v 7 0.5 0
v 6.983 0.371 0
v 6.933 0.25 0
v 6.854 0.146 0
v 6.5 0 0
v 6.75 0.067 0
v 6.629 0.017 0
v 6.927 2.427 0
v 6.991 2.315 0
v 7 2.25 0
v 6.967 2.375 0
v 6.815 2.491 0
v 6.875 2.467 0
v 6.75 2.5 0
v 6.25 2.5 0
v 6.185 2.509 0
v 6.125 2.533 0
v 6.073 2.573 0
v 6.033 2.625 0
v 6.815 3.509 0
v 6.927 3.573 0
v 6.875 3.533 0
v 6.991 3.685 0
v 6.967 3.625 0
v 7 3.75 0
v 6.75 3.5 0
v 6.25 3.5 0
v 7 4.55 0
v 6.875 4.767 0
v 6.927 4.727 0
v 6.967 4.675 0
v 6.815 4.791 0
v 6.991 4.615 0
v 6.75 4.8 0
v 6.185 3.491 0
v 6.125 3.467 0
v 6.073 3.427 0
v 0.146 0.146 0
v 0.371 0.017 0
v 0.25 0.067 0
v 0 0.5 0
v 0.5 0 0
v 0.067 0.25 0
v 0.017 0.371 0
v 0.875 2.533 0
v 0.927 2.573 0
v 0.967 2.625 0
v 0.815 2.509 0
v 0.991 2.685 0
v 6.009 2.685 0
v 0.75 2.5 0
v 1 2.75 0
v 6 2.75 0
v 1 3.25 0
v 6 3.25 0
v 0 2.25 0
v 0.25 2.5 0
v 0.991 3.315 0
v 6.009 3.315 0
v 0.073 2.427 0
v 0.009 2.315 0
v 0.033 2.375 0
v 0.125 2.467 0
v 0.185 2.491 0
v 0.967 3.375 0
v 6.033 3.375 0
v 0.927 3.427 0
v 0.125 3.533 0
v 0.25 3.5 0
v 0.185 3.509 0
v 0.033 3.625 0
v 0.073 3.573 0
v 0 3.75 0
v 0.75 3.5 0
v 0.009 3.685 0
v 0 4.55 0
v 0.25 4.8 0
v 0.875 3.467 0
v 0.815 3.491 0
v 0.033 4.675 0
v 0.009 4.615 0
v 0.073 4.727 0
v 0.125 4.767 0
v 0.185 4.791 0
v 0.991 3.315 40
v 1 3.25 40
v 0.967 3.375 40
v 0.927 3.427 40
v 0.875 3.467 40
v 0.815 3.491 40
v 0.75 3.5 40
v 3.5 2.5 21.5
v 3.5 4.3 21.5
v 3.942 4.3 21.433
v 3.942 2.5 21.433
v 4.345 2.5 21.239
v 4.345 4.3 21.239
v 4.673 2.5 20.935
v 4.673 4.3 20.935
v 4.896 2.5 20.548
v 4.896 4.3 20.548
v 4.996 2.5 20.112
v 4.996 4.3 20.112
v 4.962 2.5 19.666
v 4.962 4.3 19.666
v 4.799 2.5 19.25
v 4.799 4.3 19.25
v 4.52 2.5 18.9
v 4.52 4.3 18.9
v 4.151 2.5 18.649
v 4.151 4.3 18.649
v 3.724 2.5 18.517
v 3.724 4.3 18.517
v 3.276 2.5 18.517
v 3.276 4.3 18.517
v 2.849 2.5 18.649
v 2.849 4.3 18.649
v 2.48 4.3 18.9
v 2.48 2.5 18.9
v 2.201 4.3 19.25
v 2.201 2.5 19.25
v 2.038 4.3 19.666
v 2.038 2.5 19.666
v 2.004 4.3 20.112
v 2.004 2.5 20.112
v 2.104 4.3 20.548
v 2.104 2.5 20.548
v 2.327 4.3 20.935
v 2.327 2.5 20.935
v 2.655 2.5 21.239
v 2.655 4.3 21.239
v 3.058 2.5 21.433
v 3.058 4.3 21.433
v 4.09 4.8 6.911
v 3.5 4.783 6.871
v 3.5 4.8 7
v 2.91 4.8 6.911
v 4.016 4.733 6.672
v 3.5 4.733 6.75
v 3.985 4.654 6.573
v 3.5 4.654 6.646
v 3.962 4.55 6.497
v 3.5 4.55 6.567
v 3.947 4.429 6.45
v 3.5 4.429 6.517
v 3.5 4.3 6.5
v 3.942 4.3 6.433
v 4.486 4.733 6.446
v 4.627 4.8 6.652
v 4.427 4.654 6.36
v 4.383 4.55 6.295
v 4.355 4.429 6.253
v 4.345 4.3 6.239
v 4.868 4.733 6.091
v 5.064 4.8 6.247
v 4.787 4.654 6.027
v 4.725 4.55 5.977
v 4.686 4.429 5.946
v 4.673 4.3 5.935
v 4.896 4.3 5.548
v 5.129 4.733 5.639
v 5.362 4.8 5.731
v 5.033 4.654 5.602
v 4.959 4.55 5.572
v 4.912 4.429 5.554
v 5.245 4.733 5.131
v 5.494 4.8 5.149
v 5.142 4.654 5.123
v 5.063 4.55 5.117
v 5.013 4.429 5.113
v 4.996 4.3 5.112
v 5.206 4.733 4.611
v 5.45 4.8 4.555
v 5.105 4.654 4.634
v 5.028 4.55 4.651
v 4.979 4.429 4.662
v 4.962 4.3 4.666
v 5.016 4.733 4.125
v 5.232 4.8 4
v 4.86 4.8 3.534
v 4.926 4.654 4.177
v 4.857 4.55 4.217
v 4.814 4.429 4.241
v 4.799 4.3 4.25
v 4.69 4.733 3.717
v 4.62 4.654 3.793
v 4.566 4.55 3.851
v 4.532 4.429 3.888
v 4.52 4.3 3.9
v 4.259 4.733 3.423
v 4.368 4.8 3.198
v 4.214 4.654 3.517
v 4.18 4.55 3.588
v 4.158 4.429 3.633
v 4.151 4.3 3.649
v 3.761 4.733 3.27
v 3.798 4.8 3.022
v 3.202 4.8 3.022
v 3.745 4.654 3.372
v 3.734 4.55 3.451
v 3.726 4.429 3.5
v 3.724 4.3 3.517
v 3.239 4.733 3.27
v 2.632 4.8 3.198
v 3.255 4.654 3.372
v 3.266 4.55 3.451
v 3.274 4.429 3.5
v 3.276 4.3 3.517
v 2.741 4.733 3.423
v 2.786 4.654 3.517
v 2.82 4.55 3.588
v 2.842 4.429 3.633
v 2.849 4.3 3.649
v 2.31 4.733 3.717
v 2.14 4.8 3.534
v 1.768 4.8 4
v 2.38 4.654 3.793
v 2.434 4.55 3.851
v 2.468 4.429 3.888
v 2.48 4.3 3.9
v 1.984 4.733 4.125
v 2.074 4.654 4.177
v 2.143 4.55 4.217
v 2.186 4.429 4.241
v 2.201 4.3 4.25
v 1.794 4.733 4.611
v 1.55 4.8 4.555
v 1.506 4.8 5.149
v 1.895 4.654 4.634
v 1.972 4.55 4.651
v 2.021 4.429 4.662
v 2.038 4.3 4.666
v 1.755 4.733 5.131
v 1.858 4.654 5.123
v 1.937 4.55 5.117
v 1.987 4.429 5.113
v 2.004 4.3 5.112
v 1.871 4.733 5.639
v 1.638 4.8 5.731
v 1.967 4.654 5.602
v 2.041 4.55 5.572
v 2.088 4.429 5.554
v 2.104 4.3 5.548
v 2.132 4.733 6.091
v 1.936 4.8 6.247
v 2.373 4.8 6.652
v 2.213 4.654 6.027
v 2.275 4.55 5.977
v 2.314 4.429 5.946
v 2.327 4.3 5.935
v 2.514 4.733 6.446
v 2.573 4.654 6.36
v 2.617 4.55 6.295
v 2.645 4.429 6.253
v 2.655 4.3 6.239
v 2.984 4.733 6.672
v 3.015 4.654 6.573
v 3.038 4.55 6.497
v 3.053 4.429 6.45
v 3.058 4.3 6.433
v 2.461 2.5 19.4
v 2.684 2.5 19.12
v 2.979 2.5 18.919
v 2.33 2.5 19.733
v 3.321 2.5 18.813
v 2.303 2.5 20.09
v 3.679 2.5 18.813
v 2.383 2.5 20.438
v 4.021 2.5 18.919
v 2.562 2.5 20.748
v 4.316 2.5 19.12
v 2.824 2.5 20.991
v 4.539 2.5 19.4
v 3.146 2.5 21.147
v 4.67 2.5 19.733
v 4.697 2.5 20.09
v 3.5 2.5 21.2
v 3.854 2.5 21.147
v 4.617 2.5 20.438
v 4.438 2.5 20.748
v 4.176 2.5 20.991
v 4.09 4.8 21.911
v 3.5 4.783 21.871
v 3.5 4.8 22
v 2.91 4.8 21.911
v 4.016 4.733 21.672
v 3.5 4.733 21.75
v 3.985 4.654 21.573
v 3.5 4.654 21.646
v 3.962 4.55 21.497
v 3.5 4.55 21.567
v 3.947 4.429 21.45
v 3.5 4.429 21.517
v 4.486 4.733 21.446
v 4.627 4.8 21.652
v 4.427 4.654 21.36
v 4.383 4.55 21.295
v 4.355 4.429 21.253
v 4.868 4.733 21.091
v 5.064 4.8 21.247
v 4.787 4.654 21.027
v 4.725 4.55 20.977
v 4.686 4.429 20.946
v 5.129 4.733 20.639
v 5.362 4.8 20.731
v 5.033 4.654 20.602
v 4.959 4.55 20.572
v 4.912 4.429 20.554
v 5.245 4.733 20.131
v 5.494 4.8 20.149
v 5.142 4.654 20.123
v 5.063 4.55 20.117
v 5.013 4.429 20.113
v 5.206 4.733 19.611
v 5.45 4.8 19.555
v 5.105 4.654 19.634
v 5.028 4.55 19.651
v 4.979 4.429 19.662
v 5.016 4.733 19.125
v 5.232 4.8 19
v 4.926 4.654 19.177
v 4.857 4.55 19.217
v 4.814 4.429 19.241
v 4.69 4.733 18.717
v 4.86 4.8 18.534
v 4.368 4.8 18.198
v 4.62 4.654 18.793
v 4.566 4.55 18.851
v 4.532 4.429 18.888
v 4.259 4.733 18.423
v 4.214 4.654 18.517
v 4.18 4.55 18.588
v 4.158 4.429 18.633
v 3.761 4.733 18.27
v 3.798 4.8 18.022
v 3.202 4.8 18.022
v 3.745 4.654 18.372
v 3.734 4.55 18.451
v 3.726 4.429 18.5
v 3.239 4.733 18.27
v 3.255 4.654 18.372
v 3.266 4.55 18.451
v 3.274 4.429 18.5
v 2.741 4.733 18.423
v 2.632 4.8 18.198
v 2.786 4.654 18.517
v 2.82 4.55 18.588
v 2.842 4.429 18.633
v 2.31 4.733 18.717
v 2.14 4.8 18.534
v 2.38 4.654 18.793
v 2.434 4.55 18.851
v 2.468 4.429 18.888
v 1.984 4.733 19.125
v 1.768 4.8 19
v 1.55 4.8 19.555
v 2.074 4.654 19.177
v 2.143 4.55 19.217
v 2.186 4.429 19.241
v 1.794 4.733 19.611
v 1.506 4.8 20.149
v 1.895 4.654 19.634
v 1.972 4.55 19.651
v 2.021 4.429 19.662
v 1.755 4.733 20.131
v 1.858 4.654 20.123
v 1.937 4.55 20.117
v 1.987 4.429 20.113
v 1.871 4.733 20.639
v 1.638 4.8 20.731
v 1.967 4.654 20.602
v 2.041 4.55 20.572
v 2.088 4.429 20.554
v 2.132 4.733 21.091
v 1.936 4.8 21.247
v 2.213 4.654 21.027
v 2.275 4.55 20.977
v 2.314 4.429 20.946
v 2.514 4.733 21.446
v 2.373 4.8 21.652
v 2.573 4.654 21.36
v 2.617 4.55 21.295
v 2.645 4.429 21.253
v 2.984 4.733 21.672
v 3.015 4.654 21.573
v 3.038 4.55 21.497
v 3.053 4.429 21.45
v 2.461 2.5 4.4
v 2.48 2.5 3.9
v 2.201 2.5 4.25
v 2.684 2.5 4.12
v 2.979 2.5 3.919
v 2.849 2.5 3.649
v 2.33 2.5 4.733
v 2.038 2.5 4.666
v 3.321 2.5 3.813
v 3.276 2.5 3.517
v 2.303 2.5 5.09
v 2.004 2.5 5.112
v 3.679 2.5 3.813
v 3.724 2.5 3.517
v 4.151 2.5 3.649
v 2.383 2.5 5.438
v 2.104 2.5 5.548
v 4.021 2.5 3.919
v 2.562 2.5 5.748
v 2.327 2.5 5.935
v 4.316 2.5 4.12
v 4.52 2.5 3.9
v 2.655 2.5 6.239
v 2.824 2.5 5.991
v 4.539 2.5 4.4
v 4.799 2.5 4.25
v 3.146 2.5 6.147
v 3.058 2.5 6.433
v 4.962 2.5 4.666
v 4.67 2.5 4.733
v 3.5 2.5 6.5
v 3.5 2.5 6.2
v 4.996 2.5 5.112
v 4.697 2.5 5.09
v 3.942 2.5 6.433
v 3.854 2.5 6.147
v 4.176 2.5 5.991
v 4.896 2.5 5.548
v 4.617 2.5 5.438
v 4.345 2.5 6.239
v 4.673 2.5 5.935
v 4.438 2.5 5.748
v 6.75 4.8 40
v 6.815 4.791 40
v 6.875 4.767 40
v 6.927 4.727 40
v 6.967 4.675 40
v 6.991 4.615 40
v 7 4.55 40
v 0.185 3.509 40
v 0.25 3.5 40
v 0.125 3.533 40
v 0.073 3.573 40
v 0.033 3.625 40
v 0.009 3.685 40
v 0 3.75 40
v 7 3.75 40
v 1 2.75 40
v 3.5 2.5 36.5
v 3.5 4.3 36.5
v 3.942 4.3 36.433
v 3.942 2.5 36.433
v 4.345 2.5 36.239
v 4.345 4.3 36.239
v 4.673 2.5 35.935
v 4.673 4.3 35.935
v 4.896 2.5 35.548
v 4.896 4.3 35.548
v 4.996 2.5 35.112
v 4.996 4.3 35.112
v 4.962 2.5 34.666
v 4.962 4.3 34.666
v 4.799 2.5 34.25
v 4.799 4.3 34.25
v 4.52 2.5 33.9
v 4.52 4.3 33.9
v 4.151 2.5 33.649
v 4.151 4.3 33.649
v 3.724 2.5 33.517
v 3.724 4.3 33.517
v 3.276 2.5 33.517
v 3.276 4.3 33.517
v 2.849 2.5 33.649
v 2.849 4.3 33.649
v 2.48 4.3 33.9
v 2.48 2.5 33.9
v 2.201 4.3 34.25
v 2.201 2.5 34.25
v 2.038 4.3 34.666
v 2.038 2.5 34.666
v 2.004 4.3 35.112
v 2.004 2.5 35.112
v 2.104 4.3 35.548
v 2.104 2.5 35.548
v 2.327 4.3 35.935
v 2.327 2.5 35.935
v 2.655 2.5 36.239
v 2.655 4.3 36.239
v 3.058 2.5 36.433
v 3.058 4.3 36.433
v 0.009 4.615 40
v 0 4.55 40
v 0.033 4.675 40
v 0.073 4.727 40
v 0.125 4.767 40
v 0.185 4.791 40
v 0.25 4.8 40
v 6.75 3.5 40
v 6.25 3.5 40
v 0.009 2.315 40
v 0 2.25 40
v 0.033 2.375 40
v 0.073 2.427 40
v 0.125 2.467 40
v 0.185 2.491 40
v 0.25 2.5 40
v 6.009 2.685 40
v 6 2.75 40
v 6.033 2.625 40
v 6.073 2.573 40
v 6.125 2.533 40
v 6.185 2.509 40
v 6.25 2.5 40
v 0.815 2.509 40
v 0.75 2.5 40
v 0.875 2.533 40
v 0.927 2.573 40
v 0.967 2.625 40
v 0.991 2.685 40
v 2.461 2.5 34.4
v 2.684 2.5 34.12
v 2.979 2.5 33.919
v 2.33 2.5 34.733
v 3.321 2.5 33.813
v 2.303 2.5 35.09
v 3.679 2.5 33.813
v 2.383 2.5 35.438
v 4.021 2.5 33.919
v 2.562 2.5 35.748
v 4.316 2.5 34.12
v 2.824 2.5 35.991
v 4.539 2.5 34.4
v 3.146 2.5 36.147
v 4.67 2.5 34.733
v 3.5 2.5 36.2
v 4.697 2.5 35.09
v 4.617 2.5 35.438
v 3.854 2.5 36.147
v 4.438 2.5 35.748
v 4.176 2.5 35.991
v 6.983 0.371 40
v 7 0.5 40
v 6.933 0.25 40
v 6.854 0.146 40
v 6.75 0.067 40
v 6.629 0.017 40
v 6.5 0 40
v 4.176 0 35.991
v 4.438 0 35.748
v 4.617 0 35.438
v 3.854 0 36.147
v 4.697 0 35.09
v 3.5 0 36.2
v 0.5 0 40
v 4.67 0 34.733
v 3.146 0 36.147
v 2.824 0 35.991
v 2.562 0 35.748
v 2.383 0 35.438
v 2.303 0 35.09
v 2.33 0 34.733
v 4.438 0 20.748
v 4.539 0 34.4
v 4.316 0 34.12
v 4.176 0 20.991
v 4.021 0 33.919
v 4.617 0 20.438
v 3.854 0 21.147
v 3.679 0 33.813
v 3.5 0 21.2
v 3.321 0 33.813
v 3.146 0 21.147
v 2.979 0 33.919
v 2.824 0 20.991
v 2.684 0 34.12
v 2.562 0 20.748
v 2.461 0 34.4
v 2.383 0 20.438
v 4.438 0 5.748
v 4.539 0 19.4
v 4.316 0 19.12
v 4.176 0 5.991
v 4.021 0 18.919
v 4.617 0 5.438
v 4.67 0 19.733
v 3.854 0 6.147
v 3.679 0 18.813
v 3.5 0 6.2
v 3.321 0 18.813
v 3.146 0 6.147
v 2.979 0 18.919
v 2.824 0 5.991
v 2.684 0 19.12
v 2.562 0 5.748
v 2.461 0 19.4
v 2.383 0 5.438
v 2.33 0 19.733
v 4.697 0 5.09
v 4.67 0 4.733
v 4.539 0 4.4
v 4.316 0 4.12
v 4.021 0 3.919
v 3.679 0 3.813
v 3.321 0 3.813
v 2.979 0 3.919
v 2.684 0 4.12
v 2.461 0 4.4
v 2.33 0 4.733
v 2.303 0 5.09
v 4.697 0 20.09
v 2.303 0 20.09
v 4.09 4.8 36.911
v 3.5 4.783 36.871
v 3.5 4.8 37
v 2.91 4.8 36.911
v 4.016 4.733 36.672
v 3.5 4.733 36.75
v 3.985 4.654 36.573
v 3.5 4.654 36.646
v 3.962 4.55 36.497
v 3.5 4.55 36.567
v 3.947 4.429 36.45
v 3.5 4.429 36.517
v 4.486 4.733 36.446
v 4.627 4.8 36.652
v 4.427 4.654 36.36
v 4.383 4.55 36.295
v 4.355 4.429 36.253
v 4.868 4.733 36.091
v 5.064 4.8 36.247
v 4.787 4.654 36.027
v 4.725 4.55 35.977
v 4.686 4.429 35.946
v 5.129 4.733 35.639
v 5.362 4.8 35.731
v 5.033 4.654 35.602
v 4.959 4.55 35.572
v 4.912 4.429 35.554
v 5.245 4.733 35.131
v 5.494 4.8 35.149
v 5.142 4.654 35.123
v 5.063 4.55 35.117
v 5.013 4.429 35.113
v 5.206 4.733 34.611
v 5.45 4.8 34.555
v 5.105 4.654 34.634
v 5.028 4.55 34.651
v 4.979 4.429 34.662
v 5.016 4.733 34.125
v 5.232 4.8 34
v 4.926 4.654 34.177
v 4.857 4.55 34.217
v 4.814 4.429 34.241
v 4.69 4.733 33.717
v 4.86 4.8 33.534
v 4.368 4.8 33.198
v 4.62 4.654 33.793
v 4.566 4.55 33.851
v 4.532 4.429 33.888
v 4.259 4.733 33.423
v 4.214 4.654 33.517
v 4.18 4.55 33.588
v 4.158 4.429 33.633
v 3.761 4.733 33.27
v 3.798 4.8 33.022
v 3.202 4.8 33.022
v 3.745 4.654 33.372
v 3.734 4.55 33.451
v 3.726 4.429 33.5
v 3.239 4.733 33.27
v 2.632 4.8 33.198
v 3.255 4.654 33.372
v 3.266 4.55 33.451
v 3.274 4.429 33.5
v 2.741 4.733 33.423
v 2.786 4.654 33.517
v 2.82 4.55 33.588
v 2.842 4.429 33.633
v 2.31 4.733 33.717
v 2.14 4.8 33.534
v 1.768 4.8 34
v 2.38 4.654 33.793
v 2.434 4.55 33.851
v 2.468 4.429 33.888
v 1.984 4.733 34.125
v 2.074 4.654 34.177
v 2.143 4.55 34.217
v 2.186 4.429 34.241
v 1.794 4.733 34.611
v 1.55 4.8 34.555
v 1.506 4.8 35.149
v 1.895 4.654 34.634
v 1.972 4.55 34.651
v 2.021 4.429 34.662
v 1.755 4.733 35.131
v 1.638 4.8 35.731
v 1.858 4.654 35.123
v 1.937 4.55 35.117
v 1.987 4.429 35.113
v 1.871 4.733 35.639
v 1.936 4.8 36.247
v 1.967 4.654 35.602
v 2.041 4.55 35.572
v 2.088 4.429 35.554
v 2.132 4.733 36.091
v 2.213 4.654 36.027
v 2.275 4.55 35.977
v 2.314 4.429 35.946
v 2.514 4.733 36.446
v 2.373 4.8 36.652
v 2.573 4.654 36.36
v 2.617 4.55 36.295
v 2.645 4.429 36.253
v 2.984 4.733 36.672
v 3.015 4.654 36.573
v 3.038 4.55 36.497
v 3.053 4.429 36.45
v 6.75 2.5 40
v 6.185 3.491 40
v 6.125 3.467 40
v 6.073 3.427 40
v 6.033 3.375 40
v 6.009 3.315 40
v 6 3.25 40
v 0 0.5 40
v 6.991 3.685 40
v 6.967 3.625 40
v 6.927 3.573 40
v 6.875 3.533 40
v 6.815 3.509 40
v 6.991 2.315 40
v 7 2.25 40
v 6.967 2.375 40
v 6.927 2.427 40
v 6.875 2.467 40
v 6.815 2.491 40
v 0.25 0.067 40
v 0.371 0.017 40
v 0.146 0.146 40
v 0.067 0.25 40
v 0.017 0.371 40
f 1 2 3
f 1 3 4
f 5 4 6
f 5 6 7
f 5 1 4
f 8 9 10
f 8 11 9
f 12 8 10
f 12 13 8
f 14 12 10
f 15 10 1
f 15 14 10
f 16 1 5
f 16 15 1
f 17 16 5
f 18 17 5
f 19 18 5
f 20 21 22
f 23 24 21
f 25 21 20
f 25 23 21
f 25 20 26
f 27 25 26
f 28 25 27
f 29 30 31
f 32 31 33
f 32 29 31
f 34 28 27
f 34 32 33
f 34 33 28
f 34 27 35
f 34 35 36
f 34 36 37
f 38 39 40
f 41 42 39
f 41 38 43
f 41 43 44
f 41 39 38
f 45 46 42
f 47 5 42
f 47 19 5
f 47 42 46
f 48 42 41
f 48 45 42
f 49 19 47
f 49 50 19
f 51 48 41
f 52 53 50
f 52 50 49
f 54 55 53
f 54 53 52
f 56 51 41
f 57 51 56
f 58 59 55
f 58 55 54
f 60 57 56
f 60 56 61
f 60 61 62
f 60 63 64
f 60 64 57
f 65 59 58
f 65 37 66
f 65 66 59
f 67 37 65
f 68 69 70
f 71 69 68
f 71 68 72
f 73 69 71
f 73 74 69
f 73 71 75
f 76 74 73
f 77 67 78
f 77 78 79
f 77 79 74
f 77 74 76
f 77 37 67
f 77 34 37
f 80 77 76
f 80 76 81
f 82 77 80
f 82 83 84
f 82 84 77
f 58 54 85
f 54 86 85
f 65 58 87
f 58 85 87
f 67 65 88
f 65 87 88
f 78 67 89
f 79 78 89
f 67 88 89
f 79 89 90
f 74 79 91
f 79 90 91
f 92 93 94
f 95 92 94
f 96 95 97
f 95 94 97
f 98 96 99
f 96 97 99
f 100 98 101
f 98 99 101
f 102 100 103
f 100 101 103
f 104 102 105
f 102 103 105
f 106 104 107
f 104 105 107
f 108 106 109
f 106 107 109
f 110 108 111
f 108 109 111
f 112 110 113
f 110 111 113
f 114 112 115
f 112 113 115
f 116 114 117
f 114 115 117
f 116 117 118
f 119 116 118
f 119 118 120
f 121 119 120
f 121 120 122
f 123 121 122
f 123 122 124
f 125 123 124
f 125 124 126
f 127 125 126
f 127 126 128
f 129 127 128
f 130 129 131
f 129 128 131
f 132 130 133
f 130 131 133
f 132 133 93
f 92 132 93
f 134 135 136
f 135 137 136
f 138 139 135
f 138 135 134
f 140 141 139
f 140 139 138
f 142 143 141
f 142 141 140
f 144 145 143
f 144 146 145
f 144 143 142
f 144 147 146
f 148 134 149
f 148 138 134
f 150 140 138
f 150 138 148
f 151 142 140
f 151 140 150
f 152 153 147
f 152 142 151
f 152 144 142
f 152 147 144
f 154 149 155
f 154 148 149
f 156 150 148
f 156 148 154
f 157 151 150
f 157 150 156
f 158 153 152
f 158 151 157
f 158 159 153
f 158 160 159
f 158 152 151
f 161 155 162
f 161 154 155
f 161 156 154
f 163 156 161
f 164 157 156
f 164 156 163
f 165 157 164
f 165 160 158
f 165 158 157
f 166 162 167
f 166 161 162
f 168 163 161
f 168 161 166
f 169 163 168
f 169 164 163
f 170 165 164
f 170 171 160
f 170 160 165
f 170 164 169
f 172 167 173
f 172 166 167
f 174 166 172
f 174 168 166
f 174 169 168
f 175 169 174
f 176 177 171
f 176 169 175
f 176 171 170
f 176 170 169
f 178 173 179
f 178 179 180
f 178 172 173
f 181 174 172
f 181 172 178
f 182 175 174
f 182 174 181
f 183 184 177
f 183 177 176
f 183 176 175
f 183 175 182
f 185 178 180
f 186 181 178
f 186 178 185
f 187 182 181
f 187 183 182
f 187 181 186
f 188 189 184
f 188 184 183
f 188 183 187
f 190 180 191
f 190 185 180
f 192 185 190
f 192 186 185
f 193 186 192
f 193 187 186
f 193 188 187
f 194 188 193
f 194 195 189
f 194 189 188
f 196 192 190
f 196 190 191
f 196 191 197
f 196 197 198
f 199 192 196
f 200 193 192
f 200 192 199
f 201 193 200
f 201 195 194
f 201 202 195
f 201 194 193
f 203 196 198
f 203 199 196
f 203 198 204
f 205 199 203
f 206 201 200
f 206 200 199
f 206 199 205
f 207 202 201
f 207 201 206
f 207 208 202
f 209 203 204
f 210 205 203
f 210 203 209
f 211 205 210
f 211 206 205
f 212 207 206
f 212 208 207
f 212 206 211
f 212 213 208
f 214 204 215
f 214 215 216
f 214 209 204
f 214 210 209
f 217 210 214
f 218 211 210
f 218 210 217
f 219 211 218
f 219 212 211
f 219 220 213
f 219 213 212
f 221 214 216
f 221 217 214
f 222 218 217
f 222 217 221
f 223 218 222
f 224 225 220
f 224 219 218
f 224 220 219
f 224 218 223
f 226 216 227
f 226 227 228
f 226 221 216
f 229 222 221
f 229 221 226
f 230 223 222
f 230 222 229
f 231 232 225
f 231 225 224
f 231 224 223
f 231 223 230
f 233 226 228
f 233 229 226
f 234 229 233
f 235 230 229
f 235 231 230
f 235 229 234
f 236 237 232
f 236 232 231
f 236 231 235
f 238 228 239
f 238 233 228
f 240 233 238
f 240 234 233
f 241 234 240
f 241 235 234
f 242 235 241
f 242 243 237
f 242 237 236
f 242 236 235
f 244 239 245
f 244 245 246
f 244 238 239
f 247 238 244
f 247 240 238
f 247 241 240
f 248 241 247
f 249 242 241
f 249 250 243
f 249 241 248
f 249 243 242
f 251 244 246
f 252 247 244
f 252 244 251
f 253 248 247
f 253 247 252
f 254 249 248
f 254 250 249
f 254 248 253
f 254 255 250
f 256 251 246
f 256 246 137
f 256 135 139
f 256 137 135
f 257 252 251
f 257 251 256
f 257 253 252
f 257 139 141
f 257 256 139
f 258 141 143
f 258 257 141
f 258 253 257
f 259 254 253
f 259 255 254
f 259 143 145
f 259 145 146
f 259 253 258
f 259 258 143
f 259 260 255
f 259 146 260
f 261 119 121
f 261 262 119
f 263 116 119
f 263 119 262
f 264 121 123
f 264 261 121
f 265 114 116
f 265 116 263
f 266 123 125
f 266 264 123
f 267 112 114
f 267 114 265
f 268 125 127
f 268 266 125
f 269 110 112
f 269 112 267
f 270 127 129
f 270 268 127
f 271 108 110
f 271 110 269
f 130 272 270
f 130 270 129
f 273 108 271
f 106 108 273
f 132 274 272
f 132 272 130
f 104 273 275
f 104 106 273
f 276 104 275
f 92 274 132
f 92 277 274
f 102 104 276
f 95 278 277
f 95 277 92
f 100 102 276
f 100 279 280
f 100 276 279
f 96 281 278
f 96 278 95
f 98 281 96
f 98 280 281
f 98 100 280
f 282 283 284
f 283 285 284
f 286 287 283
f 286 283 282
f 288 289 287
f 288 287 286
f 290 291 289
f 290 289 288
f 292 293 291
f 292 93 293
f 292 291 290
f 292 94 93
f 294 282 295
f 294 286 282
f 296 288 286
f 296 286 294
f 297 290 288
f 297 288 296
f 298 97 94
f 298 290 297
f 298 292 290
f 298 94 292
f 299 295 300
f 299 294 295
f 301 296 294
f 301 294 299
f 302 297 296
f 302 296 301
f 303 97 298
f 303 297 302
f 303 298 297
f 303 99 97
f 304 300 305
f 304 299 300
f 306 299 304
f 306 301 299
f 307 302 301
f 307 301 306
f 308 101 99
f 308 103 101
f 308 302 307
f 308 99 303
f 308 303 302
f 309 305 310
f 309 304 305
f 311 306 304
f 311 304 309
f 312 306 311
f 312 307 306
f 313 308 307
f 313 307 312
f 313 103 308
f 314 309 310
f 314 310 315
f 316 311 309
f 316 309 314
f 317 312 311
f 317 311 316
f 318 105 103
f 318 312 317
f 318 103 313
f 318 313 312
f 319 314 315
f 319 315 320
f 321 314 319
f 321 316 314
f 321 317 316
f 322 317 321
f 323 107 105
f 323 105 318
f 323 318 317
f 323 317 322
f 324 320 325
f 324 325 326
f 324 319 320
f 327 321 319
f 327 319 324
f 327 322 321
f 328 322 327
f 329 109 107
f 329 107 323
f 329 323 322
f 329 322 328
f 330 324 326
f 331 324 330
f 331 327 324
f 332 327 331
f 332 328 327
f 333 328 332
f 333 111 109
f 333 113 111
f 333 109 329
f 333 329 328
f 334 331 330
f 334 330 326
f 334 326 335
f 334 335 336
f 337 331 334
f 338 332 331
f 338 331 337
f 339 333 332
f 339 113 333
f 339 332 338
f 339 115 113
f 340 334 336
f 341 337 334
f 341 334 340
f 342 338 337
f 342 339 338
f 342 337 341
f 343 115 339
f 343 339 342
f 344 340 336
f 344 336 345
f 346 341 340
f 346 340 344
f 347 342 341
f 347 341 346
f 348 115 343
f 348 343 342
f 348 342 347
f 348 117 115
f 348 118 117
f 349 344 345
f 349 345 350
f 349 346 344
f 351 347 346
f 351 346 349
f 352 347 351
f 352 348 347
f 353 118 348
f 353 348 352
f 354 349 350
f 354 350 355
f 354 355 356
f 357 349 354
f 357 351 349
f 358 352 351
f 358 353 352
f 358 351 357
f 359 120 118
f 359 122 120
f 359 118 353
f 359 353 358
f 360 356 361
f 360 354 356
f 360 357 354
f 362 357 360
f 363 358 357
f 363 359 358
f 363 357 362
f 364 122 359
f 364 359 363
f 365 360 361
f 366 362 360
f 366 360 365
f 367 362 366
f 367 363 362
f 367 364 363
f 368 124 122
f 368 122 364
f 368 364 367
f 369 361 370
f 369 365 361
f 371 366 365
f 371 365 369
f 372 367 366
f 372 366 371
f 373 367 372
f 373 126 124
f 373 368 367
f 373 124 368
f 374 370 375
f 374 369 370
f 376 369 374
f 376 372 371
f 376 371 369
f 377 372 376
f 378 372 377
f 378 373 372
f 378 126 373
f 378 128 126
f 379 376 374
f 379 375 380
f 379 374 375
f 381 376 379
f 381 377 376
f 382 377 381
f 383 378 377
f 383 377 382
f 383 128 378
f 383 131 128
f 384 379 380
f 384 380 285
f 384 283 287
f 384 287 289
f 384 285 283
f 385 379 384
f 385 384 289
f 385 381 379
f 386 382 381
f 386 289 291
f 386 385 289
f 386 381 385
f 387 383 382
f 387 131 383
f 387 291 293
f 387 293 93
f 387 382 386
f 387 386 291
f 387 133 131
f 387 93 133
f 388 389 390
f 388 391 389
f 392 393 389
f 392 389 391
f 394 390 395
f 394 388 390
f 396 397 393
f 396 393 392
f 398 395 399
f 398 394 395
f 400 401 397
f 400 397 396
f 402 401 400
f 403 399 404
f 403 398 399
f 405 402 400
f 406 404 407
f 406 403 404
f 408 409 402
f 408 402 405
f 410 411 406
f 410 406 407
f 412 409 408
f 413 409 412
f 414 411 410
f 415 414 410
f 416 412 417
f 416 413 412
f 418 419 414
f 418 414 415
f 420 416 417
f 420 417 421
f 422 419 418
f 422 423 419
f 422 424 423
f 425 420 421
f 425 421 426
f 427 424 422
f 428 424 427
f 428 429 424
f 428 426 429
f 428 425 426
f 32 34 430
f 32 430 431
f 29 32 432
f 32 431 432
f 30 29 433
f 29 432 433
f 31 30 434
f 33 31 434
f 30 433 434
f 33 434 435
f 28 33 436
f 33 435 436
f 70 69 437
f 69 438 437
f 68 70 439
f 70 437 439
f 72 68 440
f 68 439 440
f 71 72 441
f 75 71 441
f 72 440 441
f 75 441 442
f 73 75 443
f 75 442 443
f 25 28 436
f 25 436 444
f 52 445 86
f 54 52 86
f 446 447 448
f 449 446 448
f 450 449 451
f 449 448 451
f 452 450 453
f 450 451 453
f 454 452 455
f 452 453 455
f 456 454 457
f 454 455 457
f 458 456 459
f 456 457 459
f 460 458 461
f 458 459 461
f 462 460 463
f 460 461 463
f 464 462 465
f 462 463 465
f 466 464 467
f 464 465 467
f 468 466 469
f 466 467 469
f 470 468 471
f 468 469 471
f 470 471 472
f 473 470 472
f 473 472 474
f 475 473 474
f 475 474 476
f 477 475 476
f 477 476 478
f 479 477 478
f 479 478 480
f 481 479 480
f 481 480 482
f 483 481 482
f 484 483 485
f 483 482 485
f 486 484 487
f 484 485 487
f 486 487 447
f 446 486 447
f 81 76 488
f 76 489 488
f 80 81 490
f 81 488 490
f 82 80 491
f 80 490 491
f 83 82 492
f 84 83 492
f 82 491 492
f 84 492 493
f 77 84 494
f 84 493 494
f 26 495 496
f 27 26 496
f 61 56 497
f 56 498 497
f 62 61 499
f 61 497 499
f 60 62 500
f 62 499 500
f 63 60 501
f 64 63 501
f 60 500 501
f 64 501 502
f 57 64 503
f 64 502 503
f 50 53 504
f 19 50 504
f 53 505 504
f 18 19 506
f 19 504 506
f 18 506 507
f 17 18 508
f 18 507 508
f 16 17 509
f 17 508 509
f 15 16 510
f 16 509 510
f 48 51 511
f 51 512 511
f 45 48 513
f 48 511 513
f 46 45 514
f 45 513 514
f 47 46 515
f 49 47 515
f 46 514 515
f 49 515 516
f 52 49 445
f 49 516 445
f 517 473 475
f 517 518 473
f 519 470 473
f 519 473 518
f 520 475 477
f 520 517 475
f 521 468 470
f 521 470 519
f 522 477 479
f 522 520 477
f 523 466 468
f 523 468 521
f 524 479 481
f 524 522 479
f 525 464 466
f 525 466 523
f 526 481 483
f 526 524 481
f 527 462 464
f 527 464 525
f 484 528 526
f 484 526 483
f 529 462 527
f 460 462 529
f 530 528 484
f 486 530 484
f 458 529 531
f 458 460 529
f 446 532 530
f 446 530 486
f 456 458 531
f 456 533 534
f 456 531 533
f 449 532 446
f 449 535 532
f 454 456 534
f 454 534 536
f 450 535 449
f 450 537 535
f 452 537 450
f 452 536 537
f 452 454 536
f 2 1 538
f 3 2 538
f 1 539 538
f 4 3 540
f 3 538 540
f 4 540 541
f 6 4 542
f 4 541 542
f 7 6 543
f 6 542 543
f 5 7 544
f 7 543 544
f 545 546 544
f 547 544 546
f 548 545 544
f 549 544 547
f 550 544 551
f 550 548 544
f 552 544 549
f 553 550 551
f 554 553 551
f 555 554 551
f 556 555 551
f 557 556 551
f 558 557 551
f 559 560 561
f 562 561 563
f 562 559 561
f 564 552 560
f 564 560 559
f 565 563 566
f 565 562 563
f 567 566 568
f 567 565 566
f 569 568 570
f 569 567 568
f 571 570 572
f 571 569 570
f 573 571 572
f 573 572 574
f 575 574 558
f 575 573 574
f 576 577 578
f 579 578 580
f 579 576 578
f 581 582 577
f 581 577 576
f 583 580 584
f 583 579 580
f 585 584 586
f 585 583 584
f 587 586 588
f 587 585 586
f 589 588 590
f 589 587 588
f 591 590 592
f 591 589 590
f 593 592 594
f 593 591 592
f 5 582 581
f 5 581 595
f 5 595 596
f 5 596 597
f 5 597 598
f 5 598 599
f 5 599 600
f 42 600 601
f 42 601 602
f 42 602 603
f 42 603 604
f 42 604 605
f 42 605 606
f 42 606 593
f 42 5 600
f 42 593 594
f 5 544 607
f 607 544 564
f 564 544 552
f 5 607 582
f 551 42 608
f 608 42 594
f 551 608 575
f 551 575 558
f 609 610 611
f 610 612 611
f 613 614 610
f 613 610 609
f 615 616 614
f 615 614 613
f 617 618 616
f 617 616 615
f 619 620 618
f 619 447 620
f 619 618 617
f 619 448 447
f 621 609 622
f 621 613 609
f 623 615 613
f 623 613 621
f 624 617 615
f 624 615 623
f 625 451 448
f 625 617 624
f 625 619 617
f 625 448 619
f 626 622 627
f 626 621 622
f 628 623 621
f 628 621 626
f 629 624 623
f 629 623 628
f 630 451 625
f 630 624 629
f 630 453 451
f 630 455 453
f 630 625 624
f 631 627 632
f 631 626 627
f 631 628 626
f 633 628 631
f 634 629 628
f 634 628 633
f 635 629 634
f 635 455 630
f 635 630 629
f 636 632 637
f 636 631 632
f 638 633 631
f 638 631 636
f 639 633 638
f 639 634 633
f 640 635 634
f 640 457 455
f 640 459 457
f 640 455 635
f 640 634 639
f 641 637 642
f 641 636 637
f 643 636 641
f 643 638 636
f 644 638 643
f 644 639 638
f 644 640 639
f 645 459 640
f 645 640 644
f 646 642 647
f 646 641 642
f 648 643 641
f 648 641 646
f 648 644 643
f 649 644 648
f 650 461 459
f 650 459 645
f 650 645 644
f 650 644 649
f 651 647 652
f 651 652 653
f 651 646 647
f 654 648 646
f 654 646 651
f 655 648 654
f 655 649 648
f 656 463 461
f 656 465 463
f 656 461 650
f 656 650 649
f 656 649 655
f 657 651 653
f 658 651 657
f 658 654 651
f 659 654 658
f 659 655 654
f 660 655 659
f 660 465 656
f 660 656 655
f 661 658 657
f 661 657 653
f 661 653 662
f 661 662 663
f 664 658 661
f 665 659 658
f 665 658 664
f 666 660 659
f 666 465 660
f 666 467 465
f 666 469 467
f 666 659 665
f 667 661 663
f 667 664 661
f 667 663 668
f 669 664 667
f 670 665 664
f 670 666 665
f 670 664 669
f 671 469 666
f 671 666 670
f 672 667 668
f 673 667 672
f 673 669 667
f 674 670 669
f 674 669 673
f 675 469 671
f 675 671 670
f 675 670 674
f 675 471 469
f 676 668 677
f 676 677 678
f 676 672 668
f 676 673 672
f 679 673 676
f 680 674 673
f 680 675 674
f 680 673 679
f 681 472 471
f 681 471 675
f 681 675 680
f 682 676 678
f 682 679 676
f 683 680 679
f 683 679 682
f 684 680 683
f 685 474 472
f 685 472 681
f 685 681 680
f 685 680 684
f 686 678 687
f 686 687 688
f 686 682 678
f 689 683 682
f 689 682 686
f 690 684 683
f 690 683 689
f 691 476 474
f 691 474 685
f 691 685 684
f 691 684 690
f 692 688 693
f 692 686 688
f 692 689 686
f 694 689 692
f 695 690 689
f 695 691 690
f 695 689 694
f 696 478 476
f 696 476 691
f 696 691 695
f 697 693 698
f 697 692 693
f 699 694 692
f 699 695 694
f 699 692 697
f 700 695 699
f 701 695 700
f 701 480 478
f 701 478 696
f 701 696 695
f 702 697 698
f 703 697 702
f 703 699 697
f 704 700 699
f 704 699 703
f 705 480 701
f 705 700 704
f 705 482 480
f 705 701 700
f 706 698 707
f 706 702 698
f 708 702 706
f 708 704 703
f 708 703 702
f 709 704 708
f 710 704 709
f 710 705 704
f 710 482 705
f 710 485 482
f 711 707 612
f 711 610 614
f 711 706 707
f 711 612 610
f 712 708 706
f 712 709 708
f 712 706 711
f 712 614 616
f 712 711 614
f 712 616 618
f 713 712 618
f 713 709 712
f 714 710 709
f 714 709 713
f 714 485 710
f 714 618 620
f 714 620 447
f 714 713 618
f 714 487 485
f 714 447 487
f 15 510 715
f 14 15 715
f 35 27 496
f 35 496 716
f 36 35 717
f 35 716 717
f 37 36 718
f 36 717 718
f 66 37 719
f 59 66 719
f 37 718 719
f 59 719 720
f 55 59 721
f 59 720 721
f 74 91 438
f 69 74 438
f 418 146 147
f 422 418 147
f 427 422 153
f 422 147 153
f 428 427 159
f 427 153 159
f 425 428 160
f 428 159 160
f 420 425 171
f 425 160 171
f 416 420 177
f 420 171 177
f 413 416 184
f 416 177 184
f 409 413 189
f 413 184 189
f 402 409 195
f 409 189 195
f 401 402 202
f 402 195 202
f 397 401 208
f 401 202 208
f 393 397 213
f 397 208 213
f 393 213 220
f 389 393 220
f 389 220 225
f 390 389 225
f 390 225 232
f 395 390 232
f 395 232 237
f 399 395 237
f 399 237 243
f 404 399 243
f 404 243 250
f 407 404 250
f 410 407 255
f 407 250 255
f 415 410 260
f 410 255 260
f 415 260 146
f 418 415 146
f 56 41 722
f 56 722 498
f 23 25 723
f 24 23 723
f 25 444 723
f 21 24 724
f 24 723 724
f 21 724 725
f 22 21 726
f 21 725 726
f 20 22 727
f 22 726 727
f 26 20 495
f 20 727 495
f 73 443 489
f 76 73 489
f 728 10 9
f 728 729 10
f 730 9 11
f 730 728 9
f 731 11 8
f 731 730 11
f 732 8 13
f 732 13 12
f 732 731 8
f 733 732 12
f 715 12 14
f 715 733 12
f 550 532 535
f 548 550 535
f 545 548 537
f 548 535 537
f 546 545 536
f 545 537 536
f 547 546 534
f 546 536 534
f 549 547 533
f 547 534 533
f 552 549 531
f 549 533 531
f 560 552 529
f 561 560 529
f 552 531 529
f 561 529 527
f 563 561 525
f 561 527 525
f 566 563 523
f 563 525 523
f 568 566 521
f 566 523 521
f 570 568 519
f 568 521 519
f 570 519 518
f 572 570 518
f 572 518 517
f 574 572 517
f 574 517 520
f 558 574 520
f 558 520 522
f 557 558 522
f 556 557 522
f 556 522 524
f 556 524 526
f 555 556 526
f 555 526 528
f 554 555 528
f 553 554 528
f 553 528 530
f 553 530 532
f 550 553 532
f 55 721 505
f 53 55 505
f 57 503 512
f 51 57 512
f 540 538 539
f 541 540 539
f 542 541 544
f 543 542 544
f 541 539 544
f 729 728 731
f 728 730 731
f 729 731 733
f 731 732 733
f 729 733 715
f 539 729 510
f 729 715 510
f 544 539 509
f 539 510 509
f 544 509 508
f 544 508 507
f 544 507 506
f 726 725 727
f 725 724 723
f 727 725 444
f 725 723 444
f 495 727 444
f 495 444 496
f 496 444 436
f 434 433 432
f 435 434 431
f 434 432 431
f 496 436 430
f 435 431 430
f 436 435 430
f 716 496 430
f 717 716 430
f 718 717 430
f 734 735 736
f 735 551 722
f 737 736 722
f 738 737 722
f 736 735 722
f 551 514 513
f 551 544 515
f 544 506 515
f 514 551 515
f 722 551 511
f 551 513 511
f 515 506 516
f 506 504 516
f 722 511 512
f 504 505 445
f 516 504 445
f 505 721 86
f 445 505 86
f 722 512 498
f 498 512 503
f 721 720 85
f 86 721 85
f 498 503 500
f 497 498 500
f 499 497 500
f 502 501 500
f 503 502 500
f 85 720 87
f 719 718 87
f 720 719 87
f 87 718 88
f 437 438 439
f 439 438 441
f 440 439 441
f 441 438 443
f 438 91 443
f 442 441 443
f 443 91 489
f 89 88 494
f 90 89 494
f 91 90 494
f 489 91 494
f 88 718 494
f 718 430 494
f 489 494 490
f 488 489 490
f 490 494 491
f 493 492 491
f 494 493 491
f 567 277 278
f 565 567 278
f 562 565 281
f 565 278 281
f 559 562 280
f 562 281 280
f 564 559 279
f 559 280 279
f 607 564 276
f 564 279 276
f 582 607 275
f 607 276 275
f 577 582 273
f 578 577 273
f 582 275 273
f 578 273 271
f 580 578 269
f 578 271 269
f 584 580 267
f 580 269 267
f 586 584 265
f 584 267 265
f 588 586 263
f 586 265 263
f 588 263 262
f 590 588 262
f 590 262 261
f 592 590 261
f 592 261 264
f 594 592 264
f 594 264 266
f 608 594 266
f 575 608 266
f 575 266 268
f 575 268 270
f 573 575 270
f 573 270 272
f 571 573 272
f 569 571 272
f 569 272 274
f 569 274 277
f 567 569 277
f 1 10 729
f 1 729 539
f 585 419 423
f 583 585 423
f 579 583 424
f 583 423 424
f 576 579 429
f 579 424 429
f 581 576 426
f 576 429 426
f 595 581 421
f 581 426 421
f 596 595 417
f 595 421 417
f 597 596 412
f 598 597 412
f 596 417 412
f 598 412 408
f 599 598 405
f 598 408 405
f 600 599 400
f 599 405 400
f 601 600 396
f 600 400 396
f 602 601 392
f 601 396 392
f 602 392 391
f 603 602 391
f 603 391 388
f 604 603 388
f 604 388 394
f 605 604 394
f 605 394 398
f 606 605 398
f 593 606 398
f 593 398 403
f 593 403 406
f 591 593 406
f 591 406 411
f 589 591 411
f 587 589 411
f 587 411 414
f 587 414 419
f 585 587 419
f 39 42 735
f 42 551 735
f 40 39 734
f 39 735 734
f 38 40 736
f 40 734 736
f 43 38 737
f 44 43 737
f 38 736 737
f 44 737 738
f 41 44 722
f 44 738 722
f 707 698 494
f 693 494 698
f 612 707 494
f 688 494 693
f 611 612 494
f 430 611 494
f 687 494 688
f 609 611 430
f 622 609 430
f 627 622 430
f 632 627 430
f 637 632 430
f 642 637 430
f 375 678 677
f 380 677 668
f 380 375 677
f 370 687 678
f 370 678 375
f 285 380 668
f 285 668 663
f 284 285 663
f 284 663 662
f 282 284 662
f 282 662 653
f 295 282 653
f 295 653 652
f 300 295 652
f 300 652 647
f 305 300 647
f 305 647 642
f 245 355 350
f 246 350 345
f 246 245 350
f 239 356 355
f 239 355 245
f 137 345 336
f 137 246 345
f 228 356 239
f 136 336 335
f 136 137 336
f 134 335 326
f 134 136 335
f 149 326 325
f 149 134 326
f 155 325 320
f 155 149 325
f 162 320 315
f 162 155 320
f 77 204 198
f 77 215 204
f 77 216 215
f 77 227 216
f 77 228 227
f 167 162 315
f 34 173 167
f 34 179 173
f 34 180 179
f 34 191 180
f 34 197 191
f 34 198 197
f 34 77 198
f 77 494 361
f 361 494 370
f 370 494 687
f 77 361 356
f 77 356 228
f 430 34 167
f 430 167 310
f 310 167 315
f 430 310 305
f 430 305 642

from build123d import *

# Parameters (mm, degrees)
EXTRUDE_1_DEPTH                = 40
FILLET_1_R                     = 0.25
FILLET_2_R                     = 0.5
SKETCH_2_R                     = 1.5
CUT_EXTRUDE_1_DEPTH            = 2.3
SKETCH_3_R                     = 1.2
CUT_EXTRUDE_2_DEPTH            = 41.684763733
FILLET_3_R                     = 0.5
PATTERN_LINEAR_2_COUNT         = 3
PATTERN_LINEAR_2_PITCH         = 15
FILLET_3_OF_PATTERN_LINEAR_2_R = 0.5


with BuildPart() as part:
    # 草图1 → 凸台-拉伸1 (new body)
    with BuildSketch(Plane.XY):
        Polygon((7, 2.5), (7, 0), (0, 0), (0, 2.5), (1, 2.5), (1, 3.5), (0, 3.5), (0, 4.8), (7, 4.8), (7, 3.5), (6, 3.5), (6, 2.5), align=None)
    extrude(amount=EXTRUDE_1_DEPTH)

    # 圆角1
    fillet_1_edges = [part.edges().sort_by_distance(p)[0] for p in [
        (0, 2.5, 20),
        (1, 2.5, 20),
        (1, 3.5, 20),
        (0, 3.5, 20),
        (0, 4.8, 20),
        (7, 4.8, 20),
        (7, 3.5, 20),
        (6, 3.5, 20),
        (6, 2.5, 20),
        (7, 2.5, 20),
    ]]
    fillet(fillet_1_edges, radius=FILLET_1_R)

    # 圆角2
    fillet_2_edges = [part.edges().sort_by_distance(p)[0] for p in [
        (7, 0, 20),
        (0, 0, 20),
    ]]
    fillet(fillet_2_edges, radius=FILLET_2_R)

    # 草图2 → 切除-拉伸1 (cut)
    with BuildSketch(Plane(origin=(0, 4.8, 0), x_dir=(1, 0, 0), z_dir=(0, 1, 0))):
        with Locations(Location((3.5, -5, 0), (0, 0, 270))):
            Circle(SKETCH_2_R)
    cut_extrude_1 = extrude(amount=-CUT_EXTRUDE_1_DEPTH, mode=Mode.SUBTRACT)

    # 草图3 → 切除-拉伸2 (cut, through all)
    with BuildSketch(Plane(origin=(0, 2.5, 0), x_dir=(1, 0, 0), z_dir=(0, 1, 0))):
        with Locations(Location((3.5, -5, 0), (0, 0, 270))):
            Circle(SKETCH_3_R)
    cut_extrude_2 = extrude(amount=-CUT_EXTRUDE_2_DEPTH, mode=Mode.SUBTRACT)

    # 圆角3
    fillet_3_edges = [part.edges().sort_by_distance(p)[0] for p in [
        (3.5, 4.8, 3.5),
    ]]
    fillet(fillet_3_edges, radius=FILLET_3_R)

    # 阵列(线性)2: 切除-拉伸1, 切除-拉伸2 ×3
    with Locations(*[(0, 0, i * PATTERN_LINEAR_2_PITCH) for i in range(1, PATTERN_LINEAR_2_COUNT)]):
        add(cut_extrude_1, mode=Mode.SUBTRACT)
        add(cut_extrude_2, mode=Mode.SUBTRACT)

    # 圆角3 of 阵列(线性)2
    fillet_3_of_pattern_linear_2_edges = [part.edges().sort_by_distance(p)[0] for p in [
        (3.5, 4.8, 18.5),
        (3.5, 4.8, 33.5),
    ]]
    fillet(fillet_3_of_pattern_linear_2_edges, radius=FILLET_3_OF_PATTERN_LINEAR_2_R)


solid = part.part
